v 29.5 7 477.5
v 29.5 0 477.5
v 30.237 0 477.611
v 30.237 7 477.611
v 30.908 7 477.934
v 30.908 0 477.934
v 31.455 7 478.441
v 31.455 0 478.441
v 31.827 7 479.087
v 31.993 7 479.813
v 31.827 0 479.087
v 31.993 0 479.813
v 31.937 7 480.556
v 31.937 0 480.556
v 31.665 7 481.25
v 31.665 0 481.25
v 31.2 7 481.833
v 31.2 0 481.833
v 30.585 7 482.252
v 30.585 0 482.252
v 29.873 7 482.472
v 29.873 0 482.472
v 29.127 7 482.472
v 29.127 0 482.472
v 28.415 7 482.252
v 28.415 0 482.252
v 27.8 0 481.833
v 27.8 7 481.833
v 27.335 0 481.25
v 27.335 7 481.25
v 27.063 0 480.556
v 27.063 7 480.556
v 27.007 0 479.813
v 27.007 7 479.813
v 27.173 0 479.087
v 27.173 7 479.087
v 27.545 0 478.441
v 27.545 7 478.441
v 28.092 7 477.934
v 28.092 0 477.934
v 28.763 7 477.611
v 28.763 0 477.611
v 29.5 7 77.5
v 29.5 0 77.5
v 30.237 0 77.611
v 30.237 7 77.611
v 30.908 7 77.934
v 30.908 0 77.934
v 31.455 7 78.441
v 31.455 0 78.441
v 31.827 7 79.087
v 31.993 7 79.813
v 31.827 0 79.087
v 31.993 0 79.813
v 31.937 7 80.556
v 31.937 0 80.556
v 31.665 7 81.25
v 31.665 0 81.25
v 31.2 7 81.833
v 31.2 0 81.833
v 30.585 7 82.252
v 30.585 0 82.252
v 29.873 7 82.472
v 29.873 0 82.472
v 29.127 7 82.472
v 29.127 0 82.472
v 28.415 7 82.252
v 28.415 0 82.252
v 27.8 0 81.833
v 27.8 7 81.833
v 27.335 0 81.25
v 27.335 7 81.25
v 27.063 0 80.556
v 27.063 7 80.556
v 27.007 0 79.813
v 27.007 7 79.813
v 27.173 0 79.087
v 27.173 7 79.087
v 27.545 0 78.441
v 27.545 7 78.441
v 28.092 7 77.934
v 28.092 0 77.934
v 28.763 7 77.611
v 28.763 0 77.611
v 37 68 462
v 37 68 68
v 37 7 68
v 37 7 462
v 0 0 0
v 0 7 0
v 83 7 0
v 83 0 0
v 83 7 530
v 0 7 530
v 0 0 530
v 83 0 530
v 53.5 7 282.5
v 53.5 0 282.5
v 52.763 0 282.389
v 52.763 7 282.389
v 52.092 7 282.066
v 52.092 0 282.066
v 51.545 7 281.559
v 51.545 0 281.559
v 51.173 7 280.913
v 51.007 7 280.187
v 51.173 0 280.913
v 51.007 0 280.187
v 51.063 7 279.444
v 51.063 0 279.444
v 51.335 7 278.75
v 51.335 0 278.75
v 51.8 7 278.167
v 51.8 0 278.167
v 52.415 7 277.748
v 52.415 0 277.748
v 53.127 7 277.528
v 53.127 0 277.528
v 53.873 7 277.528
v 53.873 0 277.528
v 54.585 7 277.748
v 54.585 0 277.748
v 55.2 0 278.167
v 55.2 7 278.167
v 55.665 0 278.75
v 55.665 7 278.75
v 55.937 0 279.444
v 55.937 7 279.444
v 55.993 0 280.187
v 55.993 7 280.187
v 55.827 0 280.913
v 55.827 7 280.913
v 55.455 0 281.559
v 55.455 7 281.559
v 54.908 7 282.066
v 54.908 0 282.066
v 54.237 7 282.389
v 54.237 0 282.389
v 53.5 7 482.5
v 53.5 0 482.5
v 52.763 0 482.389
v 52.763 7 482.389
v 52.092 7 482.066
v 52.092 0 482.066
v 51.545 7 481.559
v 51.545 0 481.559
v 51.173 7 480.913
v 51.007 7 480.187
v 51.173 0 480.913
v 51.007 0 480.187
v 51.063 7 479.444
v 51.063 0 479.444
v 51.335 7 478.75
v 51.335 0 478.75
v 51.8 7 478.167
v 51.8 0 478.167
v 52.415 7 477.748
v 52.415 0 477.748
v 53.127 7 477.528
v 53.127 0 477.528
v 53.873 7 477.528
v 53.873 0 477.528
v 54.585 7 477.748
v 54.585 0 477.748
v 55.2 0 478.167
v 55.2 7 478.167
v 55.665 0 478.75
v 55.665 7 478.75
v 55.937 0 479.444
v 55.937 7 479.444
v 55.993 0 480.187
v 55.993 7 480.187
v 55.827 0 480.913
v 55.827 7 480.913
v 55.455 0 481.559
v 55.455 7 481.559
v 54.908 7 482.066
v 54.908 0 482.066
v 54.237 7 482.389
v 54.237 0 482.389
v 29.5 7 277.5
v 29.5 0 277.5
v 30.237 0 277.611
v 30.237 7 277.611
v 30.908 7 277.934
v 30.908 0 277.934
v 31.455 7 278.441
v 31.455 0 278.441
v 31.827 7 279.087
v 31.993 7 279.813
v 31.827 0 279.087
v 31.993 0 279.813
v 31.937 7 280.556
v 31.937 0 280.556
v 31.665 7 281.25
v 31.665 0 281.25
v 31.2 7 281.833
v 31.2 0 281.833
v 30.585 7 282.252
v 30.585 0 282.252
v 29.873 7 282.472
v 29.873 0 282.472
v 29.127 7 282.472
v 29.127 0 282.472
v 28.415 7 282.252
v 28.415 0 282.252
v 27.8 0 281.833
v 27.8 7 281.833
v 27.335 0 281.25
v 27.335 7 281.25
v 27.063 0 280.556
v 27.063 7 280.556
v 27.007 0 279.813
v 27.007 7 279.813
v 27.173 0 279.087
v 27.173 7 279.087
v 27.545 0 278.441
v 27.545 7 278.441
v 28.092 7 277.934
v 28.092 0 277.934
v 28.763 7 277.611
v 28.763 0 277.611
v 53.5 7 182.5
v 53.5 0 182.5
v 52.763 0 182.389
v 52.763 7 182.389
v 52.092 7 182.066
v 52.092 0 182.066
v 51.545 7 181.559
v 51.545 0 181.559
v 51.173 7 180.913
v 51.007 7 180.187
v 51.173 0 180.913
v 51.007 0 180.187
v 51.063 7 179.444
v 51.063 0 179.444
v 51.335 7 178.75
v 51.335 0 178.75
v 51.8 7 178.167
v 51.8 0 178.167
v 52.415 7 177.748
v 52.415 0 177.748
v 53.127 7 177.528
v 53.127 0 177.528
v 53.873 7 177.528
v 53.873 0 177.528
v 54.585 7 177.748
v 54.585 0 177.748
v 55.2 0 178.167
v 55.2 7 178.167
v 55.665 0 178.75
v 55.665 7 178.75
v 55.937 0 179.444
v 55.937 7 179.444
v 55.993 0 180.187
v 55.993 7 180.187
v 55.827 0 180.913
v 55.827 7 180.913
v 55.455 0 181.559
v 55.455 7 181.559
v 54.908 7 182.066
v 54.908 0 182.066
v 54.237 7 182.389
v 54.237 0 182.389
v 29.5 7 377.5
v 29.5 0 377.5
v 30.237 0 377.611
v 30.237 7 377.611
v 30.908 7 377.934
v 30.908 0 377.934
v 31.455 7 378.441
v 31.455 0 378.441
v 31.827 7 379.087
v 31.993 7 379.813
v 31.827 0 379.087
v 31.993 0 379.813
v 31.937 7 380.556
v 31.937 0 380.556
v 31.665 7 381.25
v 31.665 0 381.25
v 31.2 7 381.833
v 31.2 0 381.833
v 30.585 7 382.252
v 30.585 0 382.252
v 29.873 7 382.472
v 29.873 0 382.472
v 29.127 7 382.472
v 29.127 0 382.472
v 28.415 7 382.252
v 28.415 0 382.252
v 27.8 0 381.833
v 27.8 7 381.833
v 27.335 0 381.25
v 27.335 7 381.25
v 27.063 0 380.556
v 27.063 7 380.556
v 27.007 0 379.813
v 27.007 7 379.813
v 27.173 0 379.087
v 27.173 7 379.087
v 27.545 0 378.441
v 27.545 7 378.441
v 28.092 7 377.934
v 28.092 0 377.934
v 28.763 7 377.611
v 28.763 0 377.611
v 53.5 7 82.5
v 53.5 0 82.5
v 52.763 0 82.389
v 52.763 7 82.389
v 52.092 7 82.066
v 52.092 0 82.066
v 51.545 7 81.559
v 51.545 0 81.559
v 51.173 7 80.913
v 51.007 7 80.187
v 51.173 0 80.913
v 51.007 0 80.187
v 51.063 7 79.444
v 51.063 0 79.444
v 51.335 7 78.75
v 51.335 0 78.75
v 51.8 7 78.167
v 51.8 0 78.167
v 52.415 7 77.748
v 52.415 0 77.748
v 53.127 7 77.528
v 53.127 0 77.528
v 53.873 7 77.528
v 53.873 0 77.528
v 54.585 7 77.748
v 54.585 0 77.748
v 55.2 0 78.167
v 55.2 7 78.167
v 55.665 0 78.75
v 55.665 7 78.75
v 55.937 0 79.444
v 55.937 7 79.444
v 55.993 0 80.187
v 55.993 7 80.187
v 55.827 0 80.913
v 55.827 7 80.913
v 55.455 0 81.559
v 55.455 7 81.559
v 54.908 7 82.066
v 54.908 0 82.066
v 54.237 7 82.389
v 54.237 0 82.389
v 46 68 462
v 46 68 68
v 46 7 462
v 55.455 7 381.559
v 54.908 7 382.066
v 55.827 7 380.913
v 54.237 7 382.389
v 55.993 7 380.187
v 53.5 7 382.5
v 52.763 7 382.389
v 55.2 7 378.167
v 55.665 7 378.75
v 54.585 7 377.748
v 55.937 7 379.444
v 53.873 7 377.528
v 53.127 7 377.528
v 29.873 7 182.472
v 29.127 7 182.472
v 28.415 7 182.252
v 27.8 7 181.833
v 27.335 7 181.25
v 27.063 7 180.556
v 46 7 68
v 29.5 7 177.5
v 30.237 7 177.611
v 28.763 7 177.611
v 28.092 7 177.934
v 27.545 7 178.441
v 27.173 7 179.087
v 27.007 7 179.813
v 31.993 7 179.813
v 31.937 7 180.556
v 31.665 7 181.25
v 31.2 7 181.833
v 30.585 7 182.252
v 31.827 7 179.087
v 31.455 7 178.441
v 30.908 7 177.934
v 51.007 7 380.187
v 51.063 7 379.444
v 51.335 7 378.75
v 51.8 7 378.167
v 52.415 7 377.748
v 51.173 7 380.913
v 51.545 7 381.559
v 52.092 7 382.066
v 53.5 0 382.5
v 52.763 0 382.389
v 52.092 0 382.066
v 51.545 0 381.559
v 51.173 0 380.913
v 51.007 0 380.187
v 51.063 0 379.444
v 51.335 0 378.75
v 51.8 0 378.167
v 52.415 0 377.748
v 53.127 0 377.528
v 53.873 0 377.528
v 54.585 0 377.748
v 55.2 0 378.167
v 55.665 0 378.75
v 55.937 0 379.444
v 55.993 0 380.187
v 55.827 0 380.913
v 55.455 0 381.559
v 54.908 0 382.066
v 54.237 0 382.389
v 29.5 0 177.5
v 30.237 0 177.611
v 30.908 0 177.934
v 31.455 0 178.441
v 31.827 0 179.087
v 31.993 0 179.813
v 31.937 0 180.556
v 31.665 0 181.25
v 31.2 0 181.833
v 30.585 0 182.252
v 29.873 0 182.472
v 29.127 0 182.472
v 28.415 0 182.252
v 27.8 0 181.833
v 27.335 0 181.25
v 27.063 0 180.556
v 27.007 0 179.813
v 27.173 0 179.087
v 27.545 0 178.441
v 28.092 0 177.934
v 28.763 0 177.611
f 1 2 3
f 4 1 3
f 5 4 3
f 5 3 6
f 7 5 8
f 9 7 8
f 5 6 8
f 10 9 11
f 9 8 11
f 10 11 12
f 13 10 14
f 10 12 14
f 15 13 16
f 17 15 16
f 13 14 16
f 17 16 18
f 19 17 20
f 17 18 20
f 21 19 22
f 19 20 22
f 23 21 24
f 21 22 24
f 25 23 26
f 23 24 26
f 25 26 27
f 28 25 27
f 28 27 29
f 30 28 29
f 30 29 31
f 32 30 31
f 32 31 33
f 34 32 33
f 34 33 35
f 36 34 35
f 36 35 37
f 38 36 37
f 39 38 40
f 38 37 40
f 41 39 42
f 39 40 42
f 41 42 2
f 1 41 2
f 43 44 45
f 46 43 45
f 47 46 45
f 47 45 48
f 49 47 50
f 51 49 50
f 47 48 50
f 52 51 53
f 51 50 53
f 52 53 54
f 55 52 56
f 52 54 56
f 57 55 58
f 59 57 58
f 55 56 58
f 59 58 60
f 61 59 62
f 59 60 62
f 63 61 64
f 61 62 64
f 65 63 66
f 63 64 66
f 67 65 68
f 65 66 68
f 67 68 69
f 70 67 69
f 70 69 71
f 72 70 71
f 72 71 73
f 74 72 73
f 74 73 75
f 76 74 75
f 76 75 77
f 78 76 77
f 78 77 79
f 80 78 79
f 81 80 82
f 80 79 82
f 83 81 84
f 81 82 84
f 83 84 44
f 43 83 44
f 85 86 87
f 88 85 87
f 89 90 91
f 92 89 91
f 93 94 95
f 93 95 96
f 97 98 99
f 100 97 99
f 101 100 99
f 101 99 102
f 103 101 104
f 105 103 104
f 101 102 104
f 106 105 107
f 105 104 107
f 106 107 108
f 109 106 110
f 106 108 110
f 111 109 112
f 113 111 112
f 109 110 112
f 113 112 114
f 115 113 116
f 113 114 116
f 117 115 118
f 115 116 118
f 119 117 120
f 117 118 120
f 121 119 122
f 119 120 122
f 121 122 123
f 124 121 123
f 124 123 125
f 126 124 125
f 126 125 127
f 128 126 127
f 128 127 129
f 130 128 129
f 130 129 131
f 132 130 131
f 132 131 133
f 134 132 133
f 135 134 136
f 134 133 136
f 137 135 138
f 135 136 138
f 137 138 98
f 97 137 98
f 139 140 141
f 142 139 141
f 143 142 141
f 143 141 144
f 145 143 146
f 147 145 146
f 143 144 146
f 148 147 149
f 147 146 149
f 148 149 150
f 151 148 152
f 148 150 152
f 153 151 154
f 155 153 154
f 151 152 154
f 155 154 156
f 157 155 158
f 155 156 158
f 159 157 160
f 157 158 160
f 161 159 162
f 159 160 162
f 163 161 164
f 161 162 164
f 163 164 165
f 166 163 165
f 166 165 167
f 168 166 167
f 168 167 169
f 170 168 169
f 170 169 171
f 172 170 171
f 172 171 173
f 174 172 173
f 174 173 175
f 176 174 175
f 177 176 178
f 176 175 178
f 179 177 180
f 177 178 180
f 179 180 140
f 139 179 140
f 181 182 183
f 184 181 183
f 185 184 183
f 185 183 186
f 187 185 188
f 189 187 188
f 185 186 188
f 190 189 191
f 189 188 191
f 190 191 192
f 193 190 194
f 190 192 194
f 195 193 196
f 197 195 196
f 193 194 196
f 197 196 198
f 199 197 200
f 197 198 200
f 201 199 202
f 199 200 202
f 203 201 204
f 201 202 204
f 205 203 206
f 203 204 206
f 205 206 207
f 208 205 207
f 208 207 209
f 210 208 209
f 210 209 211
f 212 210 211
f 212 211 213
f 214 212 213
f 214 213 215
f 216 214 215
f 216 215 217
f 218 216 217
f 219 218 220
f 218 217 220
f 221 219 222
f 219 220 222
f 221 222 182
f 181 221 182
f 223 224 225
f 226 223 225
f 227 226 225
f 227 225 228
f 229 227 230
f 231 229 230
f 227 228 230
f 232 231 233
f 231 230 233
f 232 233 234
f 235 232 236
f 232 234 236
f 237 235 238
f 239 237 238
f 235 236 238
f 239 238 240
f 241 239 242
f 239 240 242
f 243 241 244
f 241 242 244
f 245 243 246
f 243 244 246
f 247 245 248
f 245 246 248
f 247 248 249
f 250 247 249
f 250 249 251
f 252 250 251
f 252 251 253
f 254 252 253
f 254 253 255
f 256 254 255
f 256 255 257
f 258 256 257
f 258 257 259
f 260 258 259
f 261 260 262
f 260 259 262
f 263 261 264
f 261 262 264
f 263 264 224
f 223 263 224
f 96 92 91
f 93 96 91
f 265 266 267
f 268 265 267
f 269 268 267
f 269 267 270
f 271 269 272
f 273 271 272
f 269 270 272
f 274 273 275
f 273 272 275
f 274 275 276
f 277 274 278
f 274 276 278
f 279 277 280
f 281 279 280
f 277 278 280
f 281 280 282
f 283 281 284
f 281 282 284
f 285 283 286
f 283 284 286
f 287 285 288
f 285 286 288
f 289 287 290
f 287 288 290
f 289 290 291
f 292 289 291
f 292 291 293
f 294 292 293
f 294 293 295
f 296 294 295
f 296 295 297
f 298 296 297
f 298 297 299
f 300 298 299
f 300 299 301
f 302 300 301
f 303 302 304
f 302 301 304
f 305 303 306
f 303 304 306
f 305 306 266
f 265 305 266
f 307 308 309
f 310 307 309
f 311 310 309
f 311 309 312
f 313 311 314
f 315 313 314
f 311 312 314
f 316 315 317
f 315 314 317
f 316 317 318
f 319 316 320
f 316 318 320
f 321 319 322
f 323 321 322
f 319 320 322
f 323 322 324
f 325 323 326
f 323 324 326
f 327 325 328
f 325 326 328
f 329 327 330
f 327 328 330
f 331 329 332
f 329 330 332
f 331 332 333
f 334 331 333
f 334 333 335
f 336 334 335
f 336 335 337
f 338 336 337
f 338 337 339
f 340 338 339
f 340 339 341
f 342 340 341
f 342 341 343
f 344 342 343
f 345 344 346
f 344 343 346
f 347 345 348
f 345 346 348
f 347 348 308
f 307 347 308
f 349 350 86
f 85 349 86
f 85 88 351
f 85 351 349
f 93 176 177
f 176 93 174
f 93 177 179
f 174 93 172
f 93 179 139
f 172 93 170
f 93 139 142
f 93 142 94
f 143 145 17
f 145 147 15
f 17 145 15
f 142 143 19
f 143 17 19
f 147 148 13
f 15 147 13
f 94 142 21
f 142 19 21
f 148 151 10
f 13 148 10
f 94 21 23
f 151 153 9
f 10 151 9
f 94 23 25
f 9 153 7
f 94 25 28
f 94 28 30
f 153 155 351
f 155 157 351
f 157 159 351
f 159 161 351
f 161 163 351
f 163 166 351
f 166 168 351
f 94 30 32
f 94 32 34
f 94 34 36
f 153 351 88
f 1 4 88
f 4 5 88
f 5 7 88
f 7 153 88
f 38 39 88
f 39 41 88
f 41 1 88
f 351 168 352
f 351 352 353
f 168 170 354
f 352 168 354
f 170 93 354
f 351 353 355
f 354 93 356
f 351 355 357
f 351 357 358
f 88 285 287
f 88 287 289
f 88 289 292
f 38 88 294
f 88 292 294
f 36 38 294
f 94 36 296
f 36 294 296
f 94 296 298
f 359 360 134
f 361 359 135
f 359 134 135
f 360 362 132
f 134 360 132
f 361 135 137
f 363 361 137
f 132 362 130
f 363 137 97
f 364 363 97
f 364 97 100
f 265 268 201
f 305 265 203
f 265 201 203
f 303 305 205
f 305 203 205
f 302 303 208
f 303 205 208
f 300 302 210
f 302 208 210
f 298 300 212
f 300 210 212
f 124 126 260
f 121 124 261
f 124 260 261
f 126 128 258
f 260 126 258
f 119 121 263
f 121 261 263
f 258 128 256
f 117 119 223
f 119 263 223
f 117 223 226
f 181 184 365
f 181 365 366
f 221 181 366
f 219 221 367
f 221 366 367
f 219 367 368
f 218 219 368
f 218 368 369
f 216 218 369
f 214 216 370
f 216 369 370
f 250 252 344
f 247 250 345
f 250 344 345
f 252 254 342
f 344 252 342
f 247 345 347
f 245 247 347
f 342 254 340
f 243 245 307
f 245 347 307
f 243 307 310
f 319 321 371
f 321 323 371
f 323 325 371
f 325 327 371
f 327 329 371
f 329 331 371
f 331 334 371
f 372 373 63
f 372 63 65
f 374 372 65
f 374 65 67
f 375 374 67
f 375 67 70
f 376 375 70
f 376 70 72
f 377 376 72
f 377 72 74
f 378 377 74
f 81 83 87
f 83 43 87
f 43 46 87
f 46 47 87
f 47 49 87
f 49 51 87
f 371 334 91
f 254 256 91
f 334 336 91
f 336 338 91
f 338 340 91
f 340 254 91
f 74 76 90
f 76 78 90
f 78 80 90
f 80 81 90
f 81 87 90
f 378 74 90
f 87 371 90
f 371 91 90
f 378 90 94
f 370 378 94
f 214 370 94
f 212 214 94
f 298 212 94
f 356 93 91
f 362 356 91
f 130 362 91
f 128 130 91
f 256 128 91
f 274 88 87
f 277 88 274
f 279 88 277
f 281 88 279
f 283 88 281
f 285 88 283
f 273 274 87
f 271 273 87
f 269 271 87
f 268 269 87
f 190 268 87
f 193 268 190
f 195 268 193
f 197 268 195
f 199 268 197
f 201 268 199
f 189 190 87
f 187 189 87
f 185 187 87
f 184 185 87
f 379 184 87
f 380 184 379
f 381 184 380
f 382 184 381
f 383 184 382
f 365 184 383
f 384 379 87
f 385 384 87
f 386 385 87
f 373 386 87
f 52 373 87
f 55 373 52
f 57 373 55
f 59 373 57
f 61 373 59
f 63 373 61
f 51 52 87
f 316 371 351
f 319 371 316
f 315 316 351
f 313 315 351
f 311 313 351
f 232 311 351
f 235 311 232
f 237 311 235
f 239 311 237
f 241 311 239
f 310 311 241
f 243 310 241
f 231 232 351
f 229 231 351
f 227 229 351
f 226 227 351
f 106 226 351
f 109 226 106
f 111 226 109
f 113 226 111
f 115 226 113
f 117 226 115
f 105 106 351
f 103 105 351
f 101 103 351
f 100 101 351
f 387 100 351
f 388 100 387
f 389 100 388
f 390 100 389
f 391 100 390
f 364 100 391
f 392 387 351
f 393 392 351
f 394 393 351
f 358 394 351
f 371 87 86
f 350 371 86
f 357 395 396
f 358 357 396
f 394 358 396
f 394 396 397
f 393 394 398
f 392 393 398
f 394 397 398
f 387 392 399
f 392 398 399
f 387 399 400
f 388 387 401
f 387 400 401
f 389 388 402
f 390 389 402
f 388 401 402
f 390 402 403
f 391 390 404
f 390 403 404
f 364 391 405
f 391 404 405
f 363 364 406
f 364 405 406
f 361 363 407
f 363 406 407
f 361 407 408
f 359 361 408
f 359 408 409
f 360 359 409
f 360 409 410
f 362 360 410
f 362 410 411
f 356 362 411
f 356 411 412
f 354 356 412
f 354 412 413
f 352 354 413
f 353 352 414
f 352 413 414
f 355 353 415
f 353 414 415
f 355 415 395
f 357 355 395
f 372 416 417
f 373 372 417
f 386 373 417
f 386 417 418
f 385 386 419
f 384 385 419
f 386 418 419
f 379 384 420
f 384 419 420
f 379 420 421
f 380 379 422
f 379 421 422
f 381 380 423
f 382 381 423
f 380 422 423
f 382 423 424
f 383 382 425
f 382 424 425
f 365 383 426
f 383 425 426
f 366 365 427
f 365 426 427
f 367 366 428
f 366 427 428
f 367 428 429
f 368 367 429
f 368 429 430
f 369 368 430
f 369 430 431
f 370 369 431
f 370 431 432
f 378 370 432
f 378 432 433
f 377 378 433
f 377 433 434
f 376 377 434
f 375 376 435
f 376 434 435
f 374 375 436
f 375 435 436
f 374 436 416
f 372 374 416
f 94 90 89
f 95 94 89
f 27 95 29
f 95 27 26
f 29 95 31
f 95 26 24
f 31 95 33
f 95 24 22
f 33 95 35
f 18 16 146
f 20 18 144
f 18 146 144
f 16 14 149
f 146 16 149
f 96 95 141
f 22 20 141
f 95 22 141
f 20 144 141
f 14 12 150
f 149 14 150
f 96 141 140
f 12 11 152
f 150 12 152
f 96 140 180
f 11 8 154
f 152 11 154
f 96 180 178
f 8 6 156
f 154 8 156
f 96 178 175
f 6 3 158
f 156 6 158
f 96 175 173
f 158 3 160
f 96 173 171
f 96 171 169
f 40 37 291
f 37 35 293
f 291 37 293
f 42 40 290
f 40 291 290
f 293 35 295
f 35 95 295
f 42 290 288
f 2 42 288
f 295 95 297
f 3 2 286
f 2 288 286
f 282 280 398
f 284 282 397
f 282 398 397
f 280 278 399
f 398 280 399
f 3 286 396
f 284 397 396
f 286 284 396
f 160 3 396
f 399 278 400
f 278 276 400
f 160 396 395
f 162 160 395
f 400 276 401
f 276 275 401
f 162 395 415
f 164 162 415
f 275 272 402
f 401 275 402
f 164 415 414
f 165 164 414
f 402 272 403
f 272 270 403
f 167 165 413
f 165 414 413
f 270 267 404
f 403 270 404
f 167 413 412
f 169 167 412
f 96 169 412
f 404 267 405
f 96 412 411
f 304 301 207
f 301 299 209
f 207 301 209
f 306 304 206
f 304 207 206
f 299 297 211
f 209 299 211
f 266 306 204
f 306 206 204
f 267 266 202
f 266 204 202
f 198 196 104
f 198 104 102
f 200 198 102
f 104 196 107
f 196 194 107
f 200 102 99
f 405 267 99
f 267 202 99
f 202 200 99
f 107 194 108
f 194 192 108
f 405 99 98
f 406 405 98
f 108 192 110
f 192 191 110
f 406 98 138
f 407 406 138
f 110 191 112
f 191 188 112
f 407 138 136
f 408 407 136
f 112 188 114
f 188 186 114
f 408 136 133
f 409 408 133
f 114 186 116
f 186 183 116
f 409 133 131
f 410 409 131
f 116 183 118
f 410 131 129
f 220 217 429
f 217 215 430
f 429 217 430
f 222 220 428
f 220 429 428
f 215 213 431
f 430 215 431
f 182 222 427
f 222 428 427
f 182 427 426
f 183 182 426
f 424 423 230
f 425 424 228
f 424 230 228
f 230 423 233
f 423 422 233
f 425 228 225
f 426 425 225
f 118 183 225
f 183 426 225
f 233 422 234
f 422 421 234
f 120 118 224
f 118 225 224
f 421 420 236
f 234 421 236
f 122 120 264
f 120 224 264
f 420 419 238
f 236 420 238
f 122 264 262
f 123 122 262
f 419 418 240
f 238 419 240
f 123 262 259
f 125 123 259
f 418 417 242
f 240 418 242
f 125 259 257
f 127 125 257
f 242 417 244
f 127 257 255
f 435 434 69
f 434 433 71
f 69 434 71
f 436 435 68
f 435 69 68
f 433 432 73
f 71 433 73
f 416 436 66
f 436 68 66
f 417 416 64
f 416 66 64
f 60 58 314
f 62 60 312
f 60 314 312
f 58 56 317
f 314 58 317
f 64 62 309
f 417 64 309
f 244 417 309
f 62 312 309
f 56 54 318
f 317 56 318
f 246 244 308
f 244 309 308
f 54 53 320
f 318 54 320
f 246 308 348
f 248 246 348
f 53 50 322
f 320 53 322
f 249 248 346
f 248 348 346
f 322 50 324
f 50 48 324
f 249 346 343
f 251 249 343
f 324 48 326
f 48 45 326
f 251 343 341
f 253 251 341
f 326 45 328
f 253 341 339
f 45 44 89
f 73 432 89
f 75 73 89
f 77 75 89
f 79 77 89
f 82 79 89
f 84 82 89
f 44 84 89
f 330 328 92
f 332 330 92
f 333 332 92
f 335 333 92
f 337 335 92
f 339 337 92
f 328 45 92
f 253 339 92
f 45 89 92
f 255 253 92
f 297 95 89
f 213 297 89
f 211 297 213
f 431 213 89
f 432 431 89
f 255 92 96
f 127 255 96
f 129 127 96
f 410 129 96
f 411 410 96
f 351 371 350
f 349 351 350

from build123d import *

# Parameters (mm, degrees)
BOSS_EXTRU_1_DEPTH      = 530
ESQUISSE2_W             = 68
ESQUISSE2_H             = 61
ENL_V_MAT_EXTRU_1_DEPTH = 9
ESQUISSE3_R             = 2.5
ENL_V_MAT_EXTRU_2_DEPTH = 7


with BuildPart() as part:
    # Esquisse1 → Boss.-Extru.1 (new body)
    with BuildSketch(Plane.XY):
        Polygon((0, 0), (83, 0), (83, 7), (46, 7), (46, 68), (37, 68), (37, 7), (0, 7), align=None)
    extrude(amount=BOSS_EXTRU_1_DEPTH)

    # Esquisse2 → Enlèv. mat.-Extru.1 (cut)
    with BuildSketch(Plane.ZY.offset(-37)):
        with Locations((34, 37.5)):
            Rectangle(ESQUISSE2_W, ESQUISSE2_H)
        with Locations((496, 37.5)):
            Rectangle(ESQUISSE2_W, ESQUISSE2_H)
    extrude(amount=-ENL_V_MAT_EXTRU_1_DEPTH, mode=Mode.SUBTRACT)

    # Esquisse3 → Enlèv. mat.-Extru.2 (cut)
    with BuildSketch(Plane.XZ):
        with Locations(Location((29.5, 80, 0), (0, 0, 270))):
            Circle(ESQUISSE3_R)
        with Locations(Location((53.5, 80, 0), (0, 0, 90))):
            Circle(ESQUISSE3_R)
        with Locations(Location((29.5, 180, 0), (0, 0, 270))):
            Circle(ESQUISSE3_R)
        with Locations(Location((53.5, 180, 0), (0, 0, 90))):
            Circle(ESQUISSE3_R)
        with Locations(Location((29.5, 280, 0), (0, 0, 270))):
            Circle(ESQUISSE3_R)
        with Locations(Location((53.5, 280, 0), (0, 0, 90))):
            Circle(ESQUISSE3_R)
        with Locations(Location((29.5, 380, 0), (0, 0, 270))):
            Circle(ESQUISSE3_R)
        with Locations(Location((53.5, 380, 0), (0, 0, 90))):
            Circle(ESQUISSE3_R)
        with Locations(Location((29.5, 480, 0), (0, 0, 270))):
            Circle(ESQUISSE3_R)
        with Locations(Location((53.5, 480, 0), (0, 0, 90))):
            Circle(ESQUISSE3_R)
    extrude(amount=-ENL_V_MAT_EXTRU_2_DEPTH, mode=Mode.SUBTRACT)


solid = part.part
